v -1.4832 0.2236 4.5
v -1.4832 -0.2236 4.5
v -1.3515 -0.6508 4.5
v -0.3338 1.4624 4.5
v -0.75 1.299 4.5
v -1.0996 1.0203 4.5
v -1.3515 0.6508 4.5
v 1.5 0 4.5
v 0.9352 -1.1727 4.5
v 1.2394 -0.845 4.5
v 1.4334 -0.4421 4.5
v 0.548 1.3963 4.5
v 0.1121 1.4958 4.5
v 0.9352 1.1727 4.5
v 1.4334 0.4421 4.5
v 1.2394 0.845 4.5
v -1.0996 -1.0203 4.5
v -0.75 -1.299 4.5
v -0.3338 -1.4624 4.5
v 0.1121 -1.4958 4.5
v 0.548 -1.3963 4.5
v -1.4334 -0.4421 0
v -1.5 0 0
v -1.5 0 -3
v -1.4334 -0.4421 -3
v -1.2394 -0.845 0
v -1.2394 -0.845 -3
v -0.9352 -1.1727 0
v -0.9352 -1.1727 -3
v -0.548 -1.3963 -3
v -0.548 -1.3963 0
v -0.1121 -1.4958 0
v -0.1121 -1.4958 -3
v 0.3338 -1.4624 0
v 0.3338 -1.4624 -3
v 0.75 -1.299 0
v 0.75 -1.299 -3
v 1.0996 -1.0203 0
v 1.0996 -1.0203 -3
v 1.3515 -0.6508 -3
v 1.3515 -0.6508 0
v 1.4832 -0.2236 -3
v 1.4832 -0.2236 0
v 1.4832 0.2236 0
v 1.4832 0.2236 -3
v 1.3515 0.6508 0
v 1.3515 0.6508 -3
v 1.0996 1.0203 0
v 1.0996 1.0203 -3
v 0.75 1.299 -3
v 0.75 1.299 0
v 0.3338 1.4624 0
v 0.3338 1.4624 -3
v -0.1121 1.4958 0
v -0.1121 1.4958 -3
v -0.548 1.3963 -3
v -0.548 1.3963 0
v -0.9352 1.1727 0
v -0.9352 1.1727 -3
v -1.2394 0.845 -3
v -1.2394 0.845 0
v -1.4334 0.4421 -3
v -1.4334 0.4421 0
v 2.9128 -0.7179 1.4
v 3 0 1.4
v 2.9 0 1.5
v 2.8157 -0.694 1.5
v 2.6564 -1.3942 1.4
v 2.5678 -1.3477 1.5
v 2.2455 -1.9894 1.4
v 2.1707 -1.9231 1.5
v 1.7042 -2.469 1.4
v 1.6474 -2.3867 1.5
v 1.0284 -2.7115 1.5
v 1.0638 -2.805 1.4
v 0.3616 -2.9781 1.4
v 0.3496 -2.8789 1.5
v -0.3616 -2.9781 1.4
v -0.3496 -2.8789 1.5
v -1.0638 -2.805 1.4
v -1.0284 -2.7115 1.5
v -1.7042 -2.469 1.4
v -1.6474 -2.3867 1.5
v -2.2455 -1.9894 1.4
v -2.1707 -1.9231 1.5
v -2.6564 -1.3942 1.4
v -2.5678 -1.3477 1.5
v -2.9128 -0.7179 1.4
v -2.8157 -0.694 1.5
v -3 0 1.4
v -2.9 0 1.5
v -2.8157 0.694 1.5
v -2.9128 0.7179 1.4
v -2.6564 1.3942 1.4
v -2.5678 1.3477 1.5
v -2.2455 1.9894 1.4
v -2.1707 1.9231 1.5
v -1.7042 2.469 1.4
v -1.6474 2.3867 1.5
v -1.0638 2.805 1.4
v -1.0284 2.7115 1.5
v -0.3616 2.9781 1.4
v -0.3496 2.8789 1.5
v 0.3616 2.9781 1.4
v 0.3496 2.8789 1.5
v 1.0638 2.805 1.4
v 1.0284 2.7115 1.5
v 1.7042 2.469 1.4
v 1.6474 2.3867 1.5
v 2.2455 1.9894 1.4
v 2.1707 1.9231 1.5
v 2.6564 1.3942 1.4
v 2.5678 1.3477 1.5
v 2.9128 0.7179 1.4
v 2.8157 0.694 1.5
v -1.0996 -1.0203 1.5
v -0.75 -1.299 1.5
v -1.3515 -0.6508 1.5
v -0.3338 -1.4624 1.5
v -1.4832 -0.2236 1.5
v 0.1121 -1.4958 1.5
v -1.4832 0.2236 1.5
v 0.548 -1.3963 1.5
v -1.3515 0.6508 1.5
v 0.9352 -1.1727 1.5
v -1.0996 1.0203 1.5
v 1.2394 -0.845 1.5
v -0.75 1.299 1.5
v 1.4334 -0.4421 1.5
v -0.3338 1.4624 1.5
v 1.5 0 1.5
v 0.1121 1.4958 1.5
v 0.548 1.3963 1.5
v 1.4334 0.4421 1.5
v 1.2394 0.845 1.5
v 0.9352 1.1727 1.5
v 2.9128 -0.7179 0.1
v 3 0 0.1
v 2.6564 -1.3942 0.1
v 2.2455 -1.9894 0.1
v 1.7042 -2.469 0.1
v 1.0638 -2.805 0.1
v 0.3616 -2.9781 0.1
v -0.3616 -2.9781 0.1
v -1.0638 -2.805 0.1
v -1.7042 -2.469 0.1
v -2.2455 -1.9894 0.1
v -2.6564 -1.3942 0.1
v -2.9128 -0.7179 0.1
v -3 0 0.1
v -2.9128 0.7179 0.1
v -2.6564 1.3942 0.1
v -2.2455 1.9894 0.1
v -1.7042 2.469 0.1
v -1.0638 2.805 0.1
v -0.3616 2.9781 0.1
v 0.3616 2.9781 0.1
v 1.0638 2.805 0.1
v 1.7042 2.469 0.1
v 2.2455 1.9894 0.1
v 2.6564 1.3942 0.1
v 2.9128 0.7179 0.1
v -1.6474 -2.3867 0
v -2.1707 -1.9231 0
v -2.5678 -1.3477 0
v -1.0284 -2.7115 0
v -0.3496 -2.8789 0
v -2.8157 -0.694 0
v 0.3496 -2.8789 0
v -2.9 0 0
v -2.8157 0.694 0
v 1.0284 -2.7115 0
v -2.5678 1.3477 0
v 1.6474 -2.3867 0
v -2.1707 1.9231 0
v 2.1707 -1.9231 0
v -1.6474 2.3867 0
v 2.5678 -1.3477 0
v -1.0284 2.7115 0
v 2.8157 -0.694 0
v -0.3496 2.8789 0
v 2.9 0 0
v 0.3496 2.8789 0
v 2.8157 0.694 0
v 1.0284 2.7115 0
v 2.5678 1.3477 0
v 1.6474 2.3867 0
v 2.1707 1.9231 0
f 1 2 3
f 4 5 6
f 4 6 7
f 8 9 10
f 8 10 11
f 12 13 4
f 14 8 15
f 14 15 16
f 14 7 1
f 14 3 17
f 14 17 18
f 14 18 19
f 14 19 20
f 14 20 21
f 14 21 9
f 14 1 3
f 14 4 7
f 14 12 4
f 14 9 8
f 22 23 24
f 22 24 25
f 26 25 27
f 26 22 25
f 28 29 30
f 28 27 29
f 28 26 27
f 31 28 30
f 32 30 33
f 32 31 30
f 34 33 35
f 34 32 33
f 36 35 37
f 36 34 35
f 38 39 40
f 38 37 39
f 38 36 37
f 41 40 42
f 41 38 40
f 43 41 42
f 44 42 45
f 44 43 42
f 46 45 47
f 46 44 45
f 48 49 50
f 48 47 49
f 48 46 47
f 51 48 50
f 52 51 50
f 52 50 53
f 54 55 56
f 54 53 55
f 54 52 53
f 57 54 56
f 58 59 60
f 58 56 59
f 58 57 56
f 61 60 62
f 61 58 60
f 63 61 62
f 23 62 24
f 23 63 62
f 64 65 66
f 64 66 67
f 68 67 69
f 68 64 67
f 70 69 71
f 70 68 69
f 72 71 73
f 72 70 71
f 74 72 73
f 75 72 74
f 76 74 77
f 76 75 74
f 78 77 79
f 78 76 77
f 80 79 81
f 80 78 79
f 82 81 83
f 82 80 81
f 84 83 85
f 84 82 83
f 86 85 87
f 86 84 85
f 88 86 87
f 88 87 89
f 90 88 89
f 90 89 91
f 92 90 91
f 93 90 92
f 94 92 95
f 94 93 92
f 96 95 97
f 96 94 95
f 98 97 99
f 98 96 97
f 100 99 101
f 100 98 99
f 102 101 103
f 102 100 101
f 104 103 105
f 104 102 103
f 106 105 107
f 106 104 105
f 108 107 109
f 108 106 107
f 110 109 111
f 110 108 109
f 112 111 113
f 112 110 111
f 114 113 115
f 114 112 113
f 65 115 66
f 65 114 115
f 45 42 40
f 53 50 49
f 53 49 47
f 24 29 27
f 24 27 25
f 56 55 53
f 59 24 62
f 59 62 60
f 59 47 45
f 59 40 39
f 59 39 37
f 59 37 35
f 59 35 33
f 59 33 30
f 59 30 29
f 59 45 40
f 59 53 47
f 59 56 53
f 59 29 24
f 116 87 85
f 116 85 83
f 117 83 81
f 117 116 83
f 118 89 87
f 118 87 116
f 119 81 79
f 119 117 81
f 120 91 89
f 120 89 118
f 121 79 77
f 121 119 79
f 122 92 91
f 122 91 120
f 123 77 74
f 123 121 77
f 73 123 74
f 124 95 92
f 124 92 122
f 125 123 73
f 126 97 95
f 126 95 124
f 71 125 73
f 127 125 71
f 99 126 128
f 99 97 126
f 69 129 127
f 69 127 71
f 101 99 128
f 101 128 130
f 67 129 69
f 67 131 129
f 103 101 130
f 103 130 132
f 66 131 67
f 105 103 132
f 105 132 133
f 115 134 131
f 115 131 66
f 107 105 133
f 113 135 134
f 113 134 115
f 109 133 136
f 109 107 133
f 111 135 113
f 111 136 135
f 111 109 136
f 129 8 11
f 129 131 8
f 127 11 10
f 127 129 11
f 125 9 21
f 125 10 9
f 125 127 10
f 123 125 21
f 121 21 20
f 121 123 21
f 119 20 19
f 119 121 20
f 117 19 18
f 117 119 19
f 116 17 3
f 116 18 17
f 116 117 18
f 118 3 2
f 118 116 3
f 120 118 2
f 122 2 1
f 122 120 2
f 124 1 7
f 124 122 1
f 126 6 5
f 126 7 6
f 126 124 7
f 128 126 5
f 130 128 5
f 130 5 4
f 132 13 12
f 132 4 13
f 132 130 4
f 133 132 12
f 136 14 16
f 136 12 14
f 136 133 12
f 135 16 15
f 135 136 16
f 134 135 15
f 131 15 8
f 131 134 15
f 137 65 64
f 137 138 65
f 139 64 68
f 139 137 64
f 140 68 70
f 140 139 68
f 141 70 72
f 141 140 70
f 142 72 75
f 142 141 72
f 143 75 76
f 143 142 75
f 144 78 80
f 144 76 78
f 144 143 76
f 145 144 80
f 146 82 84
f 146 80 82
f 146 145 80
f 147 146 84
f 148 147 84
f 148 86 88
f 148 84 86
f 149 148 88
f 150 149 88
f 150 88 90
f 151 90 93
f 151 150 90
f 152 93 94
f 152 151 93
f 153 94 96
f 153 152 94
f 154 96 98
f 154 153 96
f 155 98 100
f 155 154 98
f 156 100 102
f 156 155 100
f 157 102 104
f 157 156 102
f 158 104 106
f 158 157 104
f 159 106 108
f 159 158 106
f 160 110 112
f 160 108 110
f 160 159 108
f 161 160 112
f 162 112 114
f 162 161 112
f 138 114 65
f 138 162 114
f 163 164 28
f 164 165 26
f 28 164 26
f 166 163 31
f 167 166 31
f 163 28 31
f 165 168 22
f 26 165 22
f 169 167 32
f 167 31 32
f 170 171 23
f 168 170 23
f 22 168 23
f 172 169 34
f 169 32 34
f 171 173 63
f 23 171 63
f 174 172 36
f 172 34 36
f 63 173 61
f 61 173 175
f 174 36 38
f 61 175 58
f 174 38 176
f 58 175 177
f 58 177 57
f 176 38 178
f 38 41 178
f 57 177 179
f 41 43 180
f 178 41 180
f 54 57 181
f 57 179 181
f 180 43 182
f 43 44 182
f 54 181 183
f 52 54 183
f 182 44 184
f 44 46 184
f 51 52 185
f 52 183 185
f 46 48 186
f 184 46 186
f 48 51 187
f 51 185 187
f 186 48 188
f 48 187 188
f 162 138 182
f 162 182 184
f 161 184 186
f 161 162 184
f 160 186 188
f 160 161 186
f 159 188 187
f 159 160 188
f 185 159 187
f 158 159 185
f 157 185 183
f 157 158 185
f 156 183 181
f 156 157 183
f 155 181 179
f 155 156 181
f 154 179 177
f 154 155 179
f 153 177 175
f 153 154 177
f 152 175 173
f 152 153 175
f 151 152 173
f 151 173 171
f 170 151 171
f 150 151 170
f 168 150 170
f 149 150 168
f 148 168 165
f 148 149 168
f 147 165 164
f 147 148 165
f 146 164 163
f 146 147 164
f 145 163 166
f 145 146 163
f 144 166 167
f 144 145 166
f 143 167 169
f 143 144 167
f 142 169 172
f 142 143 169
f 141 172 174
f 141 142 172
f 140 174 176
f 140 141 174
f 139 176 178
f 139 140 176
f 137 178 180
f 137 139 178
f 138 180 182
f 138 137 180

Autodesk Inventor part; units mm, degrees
ref_plane "YZ Plane" through (0, 0, 0) normal (1, 0, 0) x (0, 1, 0)
ref_plane "XZ Plane" through (0, 0, 0) normal (0, 1, 0) x (-1, 0, 0)
ref_plane "XY Plane" through (0, 0, 0) normal (0, 0, 1) x (1, 0, 0)
sketch "Sketch1" plane through (0, 0, 0) normal (0, 0, 1) x (1, 0, 0)
  circle A0 centre (0, 0) radius 3
  dimension "d0" = 6
extrude "Extrusion1" add sketch "Sketch1" along normal blind 1.5
sketch "Sketch2" plane through (0, 0, 1.5) normal (0, 0, 1) x (1, 0, 0)
  circle A0 centre (0, 0) radius 3 construction
  circle A1 centre (0, 0) radius 1.5
  dimension "d3" = 3
extrude "Extrusion2" add sketch "Sketch2" along normal blind 3
sketch "Sketch3" plane through (0, 0, 0) normal (0, 0, -1) x (-1, 0, 0)
  circle A0 centre (0, 0) radius 1.5
  dimension "d6" = 3
extrude "Extrusion3" add sketch "Sketch3" along normal blind 3
thread "Thread1" size "M3x0.5" class "6g" standard "ANSI Metric M Profile" full length
thread "Thread2" size "M3x0.5" class "6g" standard "ANSI Metric M Profile" full length
chamfer "Chamfer1" distance 0.1 angle 45 1 edges at (-3, 0, 1.5)
chamfer "Chamfer2" distance 0.1 angle 45 1 edges at (-3, 0, 0)
properties part number "threaded_coupler_m3x05_r01"
